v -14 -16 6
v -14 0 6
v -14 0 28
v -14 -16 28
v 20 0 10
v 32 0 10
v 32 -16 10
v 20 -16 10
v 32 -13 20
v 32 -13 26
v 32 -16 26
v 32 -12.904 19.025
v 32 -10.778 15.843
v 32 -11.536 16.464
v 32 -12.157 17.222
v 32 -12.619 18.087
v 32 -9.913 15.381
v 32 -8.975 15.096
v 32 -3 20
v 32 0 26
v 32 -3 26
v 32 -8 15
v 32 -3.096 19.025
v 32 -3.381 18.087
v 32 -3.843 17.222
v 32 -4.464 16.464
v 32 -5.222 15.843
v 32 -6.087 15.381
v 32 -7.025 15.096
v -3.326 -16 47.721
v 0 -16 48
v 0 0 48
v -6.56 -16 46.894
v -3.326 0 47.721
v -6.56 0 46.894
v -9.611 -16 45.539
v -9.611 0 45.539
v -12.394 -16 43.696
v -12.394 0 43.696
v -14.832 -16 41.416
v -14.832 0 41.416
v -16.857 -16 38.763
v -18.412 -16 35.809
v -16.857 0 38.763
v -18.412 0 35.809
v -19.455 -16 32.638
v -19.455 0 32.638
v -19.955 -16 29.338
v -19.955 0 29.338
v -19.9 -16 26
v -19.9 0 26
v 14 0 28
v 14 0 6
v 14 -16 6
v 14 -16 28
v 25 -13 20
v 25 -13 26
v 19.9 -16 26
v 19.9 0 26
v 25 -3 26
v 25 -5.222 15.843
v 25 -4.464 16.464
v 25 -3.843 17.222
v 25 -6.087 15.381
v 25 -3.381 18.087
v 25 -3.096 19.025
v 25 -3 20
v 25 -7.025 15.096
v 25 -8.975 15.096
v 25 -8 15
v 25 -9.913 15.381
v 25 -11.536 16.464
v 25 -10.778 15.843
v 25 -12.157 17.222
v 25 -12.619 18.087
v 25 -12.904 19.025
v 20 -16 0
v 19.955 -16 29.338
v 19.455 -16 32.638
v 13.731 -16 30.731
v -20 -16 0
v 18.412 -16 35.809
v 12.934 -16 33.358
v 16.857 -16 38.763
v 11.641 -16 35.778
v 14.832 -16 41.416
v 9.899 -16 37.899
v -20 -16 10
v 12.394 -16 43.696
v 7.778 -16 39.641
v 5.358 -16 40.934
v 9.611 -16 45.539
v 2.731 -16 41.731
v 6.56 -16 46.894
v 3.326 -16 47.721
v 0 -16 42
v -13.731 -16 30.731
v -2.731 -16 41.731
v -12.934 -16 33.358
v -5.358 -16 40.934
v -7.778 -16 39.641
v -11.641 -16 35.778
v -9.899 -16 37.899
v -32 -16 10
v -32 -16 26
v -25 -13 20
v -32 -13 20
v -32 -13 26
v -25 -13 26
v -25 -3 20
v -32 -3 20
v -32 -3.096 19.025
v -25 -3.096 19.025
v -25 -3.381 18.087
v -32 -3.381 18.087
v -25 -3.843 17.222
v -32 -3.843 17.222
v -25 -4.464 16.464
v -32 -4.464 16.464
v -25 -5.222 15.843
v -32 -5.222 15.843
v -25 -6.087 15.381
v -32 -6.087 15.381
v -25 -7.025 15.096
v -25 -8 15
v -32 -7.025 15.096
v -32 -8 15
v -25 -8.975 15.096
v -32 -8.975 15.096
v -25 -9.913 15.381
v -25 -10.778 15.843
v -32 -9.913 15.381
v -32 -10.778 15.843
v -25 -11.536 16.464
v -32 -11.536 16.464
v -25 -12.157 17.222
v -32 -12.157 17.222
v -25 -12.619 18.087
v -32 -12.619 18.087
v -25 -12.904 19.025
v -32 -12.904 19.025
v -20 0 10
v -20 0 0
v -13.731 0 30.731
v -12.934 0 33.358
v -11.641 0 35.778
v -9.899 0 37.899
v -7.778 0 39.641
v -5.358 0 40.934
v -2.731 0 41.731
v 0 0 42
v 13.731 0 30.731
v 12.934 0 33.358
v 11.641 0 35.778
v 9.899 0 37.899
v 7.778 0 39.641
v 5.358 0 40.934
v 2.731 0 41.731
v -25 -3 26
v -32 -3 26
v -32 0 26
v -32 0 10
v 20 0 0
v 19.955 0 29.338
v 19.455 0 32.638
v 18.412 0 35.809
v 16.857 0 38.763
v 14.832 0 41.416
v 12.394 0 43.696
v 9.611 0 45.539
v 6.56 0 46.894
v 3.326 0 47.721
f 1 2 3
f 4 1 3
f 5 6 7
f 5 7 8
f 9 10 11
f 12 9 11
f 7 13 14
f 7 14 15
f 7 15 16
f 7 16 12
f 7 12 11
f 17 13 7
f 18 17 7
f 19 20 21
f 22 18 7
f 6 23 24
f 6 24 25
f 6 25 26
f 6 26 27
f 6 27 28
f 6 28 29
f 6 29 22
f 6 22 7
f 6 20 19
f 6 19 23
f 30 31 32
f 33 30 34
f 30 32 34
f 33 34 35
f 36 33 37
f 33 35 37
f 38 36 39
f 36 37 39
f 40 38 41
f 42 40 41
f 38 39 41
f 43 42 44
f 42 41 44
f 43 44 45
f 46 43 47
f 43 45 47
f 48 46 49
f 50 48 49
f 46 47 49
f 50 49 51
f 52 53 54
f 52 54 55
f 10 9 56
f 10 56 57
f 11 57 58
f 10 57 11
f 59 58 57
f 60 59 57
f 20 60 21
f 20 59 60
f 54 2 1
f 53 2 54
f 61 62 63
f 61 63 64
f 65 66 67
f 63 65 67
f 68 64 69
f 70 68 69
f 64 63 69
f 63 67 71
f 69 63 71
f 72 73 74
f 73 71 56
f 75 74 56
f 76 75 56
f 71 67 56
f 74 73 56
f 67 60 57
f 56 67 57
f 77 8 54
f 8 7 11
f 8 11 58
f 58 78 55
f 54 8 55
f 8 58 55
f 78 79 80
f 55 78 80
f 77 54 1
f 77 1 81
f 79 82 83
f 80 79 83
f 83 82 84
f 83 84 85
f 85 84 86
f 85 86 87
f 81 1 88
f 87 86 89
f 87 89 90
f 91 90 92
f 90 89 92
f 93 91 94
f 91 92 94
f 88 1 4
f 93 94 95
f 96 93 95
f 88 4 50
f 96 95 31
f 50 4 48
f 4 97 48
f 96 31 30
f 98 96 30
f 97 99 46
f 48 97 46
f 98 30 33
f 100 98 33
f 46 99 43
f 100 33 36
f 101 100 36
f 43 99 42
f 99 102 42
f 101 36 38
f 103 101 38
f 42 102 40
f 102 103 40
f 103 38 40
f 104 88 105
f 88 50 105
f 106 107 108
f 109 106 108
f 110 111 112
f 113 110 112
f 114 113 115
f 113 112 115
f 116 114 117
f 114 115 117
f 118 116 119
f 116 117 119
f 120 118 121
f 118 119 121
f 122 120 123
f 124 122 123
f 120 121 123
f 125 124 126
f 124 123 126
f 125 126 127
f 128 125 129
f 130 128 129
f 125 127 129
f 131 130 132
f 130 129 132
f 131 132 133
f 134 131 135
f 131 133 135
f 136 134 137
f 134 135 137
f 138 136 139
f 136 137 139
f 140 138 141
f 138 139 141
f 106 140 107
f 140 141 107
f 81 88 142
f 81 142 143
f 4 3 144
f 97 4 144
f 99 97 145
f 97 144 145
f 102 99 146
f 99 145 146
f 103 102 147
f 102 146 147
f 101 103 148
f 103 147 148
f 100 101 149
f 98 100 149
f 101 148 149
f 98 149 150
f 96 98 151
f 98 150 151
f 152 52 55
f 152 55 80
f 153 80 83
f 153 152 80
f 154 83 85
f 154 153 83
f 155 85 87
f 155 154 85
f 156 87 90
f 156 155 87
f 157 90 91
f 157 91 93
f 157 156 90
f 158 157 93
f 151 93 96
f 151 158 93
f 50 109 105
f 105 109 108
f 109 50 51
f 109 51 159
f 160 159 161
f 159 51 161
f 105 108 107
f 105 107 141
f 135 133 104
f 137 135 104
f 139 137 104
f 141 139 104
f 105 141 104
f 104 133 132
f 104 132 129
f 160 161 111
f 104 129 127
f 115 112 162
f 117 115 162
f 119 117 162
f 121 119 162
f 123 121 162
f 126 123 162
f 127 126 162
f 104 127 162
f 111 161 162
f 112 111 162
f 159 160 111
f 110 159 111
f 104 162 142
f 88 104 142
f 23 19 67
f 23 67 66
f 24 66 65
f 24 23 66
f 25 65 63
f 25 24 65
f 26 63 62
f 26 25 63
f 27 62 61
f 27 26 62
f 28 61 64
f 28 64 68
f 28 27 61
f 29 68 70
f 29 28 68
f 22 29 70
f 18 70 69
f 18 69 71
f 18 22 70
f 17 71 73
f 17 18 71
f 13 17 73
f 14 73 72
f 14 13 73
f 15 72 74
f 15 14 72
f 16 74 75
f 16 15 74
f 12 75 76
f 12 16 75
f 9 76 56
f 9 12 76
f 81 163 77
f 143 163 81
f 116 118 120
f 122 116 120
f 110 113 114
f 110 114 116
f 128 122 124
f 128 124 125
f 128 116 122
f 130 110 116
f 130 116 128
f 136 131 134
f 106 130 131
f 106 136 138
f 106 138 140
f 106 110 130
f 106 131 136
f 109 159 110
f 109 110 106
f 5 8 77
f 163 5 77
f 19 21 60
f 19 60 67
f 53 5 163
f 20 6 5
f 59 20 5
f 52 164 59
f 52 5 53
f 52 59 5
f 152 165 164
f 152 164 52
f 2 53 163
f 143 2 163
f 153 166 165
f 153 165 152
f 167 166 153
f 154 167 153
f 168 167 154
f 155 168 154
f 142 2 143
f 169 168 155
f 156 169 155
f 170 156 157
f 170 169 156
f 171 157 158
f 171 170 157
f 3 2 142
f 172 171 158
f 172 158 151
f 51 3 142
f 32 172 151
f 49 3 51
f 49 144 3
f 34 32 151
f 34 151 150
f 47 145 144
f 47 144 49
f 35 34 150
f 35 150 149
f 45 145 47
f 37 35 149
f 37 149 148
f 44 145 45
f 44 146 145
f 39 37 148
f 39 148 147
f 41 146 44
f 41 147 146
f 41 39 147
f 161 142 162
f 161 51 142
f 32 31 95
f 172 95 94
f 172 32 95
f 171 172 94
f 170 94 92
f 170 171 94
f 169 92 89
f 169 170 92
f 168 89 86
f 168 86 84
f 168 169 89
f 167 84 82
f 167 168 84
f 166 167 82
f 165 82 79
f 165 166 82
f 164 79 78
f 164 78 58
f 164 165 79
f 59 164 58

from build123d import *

# Parameters (mm, degrees)
F1_DEPTH = 16
F3_DEPTH = 7


# Not quite as in the source:
# - a pattern or mirror of a feature is missing from the dataset's text; its kind, count and spacing are read off the source's solid


with BuildPart() as f1:
    # F0 (on Front) → F1 (new body)
    with BuildSketch(Plane.XZ):
        with BuildLine():
            Line((-20, 0), (0, 0))
            Line((0, 0), (0, 6))
            Line((0, 6), (-14, 6))
            Line((-14, 6), (-14, 28))
            ThreePointArc((-14, 28), (-9.8994949366, 37.8994949366), (0, 42))
            Line((0, 42), (0, 48))
            ThreePointArc((0, 48), (-14.8323969742, 41.416407865), (-19.8997487421, 26))
            Line((-19.8997487421, 26), (-32, 26))
            Line((-32, 26), (-32, 10))
            Line((-32, 10), (-20, 10))
            Line((-20, 10), (-20, 0))
        make_face()
    extrude(amount=F1_DEPTH)

    # F1_copies: F1 across plane


with BuildPart() as f1_1:
    add(f1.part)
    add(f1.part.mirror(Plane(origin=(0, 0, 0), x_dir=(0, 0, 1), z_dir=(1, 0, 0))))

    # F2 (on face) → F3 (cut)
    with BuildSketch(Plane(origin=(-32, 0, 0), x_dir=(0, -1, 0), z_dir=(-1, 0, 0))):
        with BuildLine():
            Line((13, 26), (3, 26))
            Line((3, 26), (3, 20))
            ThreePointArc((3, 20), (8, 15), (13, 20))
            Line((13, 20), (13, 26))
        make_face()
    f3 = extrude(amount=-F3_DEPTH, mode=Mode.SUBTRACT)

    # F3_copies: F3 across plane
    add(f3.mirror(Plane(origin=(0, 0, 0), x_dir=(0, 0, 1), z_dir=(1, 0, 0))), mode=Mode.SUBTRACT)


solid = f1_1.part
